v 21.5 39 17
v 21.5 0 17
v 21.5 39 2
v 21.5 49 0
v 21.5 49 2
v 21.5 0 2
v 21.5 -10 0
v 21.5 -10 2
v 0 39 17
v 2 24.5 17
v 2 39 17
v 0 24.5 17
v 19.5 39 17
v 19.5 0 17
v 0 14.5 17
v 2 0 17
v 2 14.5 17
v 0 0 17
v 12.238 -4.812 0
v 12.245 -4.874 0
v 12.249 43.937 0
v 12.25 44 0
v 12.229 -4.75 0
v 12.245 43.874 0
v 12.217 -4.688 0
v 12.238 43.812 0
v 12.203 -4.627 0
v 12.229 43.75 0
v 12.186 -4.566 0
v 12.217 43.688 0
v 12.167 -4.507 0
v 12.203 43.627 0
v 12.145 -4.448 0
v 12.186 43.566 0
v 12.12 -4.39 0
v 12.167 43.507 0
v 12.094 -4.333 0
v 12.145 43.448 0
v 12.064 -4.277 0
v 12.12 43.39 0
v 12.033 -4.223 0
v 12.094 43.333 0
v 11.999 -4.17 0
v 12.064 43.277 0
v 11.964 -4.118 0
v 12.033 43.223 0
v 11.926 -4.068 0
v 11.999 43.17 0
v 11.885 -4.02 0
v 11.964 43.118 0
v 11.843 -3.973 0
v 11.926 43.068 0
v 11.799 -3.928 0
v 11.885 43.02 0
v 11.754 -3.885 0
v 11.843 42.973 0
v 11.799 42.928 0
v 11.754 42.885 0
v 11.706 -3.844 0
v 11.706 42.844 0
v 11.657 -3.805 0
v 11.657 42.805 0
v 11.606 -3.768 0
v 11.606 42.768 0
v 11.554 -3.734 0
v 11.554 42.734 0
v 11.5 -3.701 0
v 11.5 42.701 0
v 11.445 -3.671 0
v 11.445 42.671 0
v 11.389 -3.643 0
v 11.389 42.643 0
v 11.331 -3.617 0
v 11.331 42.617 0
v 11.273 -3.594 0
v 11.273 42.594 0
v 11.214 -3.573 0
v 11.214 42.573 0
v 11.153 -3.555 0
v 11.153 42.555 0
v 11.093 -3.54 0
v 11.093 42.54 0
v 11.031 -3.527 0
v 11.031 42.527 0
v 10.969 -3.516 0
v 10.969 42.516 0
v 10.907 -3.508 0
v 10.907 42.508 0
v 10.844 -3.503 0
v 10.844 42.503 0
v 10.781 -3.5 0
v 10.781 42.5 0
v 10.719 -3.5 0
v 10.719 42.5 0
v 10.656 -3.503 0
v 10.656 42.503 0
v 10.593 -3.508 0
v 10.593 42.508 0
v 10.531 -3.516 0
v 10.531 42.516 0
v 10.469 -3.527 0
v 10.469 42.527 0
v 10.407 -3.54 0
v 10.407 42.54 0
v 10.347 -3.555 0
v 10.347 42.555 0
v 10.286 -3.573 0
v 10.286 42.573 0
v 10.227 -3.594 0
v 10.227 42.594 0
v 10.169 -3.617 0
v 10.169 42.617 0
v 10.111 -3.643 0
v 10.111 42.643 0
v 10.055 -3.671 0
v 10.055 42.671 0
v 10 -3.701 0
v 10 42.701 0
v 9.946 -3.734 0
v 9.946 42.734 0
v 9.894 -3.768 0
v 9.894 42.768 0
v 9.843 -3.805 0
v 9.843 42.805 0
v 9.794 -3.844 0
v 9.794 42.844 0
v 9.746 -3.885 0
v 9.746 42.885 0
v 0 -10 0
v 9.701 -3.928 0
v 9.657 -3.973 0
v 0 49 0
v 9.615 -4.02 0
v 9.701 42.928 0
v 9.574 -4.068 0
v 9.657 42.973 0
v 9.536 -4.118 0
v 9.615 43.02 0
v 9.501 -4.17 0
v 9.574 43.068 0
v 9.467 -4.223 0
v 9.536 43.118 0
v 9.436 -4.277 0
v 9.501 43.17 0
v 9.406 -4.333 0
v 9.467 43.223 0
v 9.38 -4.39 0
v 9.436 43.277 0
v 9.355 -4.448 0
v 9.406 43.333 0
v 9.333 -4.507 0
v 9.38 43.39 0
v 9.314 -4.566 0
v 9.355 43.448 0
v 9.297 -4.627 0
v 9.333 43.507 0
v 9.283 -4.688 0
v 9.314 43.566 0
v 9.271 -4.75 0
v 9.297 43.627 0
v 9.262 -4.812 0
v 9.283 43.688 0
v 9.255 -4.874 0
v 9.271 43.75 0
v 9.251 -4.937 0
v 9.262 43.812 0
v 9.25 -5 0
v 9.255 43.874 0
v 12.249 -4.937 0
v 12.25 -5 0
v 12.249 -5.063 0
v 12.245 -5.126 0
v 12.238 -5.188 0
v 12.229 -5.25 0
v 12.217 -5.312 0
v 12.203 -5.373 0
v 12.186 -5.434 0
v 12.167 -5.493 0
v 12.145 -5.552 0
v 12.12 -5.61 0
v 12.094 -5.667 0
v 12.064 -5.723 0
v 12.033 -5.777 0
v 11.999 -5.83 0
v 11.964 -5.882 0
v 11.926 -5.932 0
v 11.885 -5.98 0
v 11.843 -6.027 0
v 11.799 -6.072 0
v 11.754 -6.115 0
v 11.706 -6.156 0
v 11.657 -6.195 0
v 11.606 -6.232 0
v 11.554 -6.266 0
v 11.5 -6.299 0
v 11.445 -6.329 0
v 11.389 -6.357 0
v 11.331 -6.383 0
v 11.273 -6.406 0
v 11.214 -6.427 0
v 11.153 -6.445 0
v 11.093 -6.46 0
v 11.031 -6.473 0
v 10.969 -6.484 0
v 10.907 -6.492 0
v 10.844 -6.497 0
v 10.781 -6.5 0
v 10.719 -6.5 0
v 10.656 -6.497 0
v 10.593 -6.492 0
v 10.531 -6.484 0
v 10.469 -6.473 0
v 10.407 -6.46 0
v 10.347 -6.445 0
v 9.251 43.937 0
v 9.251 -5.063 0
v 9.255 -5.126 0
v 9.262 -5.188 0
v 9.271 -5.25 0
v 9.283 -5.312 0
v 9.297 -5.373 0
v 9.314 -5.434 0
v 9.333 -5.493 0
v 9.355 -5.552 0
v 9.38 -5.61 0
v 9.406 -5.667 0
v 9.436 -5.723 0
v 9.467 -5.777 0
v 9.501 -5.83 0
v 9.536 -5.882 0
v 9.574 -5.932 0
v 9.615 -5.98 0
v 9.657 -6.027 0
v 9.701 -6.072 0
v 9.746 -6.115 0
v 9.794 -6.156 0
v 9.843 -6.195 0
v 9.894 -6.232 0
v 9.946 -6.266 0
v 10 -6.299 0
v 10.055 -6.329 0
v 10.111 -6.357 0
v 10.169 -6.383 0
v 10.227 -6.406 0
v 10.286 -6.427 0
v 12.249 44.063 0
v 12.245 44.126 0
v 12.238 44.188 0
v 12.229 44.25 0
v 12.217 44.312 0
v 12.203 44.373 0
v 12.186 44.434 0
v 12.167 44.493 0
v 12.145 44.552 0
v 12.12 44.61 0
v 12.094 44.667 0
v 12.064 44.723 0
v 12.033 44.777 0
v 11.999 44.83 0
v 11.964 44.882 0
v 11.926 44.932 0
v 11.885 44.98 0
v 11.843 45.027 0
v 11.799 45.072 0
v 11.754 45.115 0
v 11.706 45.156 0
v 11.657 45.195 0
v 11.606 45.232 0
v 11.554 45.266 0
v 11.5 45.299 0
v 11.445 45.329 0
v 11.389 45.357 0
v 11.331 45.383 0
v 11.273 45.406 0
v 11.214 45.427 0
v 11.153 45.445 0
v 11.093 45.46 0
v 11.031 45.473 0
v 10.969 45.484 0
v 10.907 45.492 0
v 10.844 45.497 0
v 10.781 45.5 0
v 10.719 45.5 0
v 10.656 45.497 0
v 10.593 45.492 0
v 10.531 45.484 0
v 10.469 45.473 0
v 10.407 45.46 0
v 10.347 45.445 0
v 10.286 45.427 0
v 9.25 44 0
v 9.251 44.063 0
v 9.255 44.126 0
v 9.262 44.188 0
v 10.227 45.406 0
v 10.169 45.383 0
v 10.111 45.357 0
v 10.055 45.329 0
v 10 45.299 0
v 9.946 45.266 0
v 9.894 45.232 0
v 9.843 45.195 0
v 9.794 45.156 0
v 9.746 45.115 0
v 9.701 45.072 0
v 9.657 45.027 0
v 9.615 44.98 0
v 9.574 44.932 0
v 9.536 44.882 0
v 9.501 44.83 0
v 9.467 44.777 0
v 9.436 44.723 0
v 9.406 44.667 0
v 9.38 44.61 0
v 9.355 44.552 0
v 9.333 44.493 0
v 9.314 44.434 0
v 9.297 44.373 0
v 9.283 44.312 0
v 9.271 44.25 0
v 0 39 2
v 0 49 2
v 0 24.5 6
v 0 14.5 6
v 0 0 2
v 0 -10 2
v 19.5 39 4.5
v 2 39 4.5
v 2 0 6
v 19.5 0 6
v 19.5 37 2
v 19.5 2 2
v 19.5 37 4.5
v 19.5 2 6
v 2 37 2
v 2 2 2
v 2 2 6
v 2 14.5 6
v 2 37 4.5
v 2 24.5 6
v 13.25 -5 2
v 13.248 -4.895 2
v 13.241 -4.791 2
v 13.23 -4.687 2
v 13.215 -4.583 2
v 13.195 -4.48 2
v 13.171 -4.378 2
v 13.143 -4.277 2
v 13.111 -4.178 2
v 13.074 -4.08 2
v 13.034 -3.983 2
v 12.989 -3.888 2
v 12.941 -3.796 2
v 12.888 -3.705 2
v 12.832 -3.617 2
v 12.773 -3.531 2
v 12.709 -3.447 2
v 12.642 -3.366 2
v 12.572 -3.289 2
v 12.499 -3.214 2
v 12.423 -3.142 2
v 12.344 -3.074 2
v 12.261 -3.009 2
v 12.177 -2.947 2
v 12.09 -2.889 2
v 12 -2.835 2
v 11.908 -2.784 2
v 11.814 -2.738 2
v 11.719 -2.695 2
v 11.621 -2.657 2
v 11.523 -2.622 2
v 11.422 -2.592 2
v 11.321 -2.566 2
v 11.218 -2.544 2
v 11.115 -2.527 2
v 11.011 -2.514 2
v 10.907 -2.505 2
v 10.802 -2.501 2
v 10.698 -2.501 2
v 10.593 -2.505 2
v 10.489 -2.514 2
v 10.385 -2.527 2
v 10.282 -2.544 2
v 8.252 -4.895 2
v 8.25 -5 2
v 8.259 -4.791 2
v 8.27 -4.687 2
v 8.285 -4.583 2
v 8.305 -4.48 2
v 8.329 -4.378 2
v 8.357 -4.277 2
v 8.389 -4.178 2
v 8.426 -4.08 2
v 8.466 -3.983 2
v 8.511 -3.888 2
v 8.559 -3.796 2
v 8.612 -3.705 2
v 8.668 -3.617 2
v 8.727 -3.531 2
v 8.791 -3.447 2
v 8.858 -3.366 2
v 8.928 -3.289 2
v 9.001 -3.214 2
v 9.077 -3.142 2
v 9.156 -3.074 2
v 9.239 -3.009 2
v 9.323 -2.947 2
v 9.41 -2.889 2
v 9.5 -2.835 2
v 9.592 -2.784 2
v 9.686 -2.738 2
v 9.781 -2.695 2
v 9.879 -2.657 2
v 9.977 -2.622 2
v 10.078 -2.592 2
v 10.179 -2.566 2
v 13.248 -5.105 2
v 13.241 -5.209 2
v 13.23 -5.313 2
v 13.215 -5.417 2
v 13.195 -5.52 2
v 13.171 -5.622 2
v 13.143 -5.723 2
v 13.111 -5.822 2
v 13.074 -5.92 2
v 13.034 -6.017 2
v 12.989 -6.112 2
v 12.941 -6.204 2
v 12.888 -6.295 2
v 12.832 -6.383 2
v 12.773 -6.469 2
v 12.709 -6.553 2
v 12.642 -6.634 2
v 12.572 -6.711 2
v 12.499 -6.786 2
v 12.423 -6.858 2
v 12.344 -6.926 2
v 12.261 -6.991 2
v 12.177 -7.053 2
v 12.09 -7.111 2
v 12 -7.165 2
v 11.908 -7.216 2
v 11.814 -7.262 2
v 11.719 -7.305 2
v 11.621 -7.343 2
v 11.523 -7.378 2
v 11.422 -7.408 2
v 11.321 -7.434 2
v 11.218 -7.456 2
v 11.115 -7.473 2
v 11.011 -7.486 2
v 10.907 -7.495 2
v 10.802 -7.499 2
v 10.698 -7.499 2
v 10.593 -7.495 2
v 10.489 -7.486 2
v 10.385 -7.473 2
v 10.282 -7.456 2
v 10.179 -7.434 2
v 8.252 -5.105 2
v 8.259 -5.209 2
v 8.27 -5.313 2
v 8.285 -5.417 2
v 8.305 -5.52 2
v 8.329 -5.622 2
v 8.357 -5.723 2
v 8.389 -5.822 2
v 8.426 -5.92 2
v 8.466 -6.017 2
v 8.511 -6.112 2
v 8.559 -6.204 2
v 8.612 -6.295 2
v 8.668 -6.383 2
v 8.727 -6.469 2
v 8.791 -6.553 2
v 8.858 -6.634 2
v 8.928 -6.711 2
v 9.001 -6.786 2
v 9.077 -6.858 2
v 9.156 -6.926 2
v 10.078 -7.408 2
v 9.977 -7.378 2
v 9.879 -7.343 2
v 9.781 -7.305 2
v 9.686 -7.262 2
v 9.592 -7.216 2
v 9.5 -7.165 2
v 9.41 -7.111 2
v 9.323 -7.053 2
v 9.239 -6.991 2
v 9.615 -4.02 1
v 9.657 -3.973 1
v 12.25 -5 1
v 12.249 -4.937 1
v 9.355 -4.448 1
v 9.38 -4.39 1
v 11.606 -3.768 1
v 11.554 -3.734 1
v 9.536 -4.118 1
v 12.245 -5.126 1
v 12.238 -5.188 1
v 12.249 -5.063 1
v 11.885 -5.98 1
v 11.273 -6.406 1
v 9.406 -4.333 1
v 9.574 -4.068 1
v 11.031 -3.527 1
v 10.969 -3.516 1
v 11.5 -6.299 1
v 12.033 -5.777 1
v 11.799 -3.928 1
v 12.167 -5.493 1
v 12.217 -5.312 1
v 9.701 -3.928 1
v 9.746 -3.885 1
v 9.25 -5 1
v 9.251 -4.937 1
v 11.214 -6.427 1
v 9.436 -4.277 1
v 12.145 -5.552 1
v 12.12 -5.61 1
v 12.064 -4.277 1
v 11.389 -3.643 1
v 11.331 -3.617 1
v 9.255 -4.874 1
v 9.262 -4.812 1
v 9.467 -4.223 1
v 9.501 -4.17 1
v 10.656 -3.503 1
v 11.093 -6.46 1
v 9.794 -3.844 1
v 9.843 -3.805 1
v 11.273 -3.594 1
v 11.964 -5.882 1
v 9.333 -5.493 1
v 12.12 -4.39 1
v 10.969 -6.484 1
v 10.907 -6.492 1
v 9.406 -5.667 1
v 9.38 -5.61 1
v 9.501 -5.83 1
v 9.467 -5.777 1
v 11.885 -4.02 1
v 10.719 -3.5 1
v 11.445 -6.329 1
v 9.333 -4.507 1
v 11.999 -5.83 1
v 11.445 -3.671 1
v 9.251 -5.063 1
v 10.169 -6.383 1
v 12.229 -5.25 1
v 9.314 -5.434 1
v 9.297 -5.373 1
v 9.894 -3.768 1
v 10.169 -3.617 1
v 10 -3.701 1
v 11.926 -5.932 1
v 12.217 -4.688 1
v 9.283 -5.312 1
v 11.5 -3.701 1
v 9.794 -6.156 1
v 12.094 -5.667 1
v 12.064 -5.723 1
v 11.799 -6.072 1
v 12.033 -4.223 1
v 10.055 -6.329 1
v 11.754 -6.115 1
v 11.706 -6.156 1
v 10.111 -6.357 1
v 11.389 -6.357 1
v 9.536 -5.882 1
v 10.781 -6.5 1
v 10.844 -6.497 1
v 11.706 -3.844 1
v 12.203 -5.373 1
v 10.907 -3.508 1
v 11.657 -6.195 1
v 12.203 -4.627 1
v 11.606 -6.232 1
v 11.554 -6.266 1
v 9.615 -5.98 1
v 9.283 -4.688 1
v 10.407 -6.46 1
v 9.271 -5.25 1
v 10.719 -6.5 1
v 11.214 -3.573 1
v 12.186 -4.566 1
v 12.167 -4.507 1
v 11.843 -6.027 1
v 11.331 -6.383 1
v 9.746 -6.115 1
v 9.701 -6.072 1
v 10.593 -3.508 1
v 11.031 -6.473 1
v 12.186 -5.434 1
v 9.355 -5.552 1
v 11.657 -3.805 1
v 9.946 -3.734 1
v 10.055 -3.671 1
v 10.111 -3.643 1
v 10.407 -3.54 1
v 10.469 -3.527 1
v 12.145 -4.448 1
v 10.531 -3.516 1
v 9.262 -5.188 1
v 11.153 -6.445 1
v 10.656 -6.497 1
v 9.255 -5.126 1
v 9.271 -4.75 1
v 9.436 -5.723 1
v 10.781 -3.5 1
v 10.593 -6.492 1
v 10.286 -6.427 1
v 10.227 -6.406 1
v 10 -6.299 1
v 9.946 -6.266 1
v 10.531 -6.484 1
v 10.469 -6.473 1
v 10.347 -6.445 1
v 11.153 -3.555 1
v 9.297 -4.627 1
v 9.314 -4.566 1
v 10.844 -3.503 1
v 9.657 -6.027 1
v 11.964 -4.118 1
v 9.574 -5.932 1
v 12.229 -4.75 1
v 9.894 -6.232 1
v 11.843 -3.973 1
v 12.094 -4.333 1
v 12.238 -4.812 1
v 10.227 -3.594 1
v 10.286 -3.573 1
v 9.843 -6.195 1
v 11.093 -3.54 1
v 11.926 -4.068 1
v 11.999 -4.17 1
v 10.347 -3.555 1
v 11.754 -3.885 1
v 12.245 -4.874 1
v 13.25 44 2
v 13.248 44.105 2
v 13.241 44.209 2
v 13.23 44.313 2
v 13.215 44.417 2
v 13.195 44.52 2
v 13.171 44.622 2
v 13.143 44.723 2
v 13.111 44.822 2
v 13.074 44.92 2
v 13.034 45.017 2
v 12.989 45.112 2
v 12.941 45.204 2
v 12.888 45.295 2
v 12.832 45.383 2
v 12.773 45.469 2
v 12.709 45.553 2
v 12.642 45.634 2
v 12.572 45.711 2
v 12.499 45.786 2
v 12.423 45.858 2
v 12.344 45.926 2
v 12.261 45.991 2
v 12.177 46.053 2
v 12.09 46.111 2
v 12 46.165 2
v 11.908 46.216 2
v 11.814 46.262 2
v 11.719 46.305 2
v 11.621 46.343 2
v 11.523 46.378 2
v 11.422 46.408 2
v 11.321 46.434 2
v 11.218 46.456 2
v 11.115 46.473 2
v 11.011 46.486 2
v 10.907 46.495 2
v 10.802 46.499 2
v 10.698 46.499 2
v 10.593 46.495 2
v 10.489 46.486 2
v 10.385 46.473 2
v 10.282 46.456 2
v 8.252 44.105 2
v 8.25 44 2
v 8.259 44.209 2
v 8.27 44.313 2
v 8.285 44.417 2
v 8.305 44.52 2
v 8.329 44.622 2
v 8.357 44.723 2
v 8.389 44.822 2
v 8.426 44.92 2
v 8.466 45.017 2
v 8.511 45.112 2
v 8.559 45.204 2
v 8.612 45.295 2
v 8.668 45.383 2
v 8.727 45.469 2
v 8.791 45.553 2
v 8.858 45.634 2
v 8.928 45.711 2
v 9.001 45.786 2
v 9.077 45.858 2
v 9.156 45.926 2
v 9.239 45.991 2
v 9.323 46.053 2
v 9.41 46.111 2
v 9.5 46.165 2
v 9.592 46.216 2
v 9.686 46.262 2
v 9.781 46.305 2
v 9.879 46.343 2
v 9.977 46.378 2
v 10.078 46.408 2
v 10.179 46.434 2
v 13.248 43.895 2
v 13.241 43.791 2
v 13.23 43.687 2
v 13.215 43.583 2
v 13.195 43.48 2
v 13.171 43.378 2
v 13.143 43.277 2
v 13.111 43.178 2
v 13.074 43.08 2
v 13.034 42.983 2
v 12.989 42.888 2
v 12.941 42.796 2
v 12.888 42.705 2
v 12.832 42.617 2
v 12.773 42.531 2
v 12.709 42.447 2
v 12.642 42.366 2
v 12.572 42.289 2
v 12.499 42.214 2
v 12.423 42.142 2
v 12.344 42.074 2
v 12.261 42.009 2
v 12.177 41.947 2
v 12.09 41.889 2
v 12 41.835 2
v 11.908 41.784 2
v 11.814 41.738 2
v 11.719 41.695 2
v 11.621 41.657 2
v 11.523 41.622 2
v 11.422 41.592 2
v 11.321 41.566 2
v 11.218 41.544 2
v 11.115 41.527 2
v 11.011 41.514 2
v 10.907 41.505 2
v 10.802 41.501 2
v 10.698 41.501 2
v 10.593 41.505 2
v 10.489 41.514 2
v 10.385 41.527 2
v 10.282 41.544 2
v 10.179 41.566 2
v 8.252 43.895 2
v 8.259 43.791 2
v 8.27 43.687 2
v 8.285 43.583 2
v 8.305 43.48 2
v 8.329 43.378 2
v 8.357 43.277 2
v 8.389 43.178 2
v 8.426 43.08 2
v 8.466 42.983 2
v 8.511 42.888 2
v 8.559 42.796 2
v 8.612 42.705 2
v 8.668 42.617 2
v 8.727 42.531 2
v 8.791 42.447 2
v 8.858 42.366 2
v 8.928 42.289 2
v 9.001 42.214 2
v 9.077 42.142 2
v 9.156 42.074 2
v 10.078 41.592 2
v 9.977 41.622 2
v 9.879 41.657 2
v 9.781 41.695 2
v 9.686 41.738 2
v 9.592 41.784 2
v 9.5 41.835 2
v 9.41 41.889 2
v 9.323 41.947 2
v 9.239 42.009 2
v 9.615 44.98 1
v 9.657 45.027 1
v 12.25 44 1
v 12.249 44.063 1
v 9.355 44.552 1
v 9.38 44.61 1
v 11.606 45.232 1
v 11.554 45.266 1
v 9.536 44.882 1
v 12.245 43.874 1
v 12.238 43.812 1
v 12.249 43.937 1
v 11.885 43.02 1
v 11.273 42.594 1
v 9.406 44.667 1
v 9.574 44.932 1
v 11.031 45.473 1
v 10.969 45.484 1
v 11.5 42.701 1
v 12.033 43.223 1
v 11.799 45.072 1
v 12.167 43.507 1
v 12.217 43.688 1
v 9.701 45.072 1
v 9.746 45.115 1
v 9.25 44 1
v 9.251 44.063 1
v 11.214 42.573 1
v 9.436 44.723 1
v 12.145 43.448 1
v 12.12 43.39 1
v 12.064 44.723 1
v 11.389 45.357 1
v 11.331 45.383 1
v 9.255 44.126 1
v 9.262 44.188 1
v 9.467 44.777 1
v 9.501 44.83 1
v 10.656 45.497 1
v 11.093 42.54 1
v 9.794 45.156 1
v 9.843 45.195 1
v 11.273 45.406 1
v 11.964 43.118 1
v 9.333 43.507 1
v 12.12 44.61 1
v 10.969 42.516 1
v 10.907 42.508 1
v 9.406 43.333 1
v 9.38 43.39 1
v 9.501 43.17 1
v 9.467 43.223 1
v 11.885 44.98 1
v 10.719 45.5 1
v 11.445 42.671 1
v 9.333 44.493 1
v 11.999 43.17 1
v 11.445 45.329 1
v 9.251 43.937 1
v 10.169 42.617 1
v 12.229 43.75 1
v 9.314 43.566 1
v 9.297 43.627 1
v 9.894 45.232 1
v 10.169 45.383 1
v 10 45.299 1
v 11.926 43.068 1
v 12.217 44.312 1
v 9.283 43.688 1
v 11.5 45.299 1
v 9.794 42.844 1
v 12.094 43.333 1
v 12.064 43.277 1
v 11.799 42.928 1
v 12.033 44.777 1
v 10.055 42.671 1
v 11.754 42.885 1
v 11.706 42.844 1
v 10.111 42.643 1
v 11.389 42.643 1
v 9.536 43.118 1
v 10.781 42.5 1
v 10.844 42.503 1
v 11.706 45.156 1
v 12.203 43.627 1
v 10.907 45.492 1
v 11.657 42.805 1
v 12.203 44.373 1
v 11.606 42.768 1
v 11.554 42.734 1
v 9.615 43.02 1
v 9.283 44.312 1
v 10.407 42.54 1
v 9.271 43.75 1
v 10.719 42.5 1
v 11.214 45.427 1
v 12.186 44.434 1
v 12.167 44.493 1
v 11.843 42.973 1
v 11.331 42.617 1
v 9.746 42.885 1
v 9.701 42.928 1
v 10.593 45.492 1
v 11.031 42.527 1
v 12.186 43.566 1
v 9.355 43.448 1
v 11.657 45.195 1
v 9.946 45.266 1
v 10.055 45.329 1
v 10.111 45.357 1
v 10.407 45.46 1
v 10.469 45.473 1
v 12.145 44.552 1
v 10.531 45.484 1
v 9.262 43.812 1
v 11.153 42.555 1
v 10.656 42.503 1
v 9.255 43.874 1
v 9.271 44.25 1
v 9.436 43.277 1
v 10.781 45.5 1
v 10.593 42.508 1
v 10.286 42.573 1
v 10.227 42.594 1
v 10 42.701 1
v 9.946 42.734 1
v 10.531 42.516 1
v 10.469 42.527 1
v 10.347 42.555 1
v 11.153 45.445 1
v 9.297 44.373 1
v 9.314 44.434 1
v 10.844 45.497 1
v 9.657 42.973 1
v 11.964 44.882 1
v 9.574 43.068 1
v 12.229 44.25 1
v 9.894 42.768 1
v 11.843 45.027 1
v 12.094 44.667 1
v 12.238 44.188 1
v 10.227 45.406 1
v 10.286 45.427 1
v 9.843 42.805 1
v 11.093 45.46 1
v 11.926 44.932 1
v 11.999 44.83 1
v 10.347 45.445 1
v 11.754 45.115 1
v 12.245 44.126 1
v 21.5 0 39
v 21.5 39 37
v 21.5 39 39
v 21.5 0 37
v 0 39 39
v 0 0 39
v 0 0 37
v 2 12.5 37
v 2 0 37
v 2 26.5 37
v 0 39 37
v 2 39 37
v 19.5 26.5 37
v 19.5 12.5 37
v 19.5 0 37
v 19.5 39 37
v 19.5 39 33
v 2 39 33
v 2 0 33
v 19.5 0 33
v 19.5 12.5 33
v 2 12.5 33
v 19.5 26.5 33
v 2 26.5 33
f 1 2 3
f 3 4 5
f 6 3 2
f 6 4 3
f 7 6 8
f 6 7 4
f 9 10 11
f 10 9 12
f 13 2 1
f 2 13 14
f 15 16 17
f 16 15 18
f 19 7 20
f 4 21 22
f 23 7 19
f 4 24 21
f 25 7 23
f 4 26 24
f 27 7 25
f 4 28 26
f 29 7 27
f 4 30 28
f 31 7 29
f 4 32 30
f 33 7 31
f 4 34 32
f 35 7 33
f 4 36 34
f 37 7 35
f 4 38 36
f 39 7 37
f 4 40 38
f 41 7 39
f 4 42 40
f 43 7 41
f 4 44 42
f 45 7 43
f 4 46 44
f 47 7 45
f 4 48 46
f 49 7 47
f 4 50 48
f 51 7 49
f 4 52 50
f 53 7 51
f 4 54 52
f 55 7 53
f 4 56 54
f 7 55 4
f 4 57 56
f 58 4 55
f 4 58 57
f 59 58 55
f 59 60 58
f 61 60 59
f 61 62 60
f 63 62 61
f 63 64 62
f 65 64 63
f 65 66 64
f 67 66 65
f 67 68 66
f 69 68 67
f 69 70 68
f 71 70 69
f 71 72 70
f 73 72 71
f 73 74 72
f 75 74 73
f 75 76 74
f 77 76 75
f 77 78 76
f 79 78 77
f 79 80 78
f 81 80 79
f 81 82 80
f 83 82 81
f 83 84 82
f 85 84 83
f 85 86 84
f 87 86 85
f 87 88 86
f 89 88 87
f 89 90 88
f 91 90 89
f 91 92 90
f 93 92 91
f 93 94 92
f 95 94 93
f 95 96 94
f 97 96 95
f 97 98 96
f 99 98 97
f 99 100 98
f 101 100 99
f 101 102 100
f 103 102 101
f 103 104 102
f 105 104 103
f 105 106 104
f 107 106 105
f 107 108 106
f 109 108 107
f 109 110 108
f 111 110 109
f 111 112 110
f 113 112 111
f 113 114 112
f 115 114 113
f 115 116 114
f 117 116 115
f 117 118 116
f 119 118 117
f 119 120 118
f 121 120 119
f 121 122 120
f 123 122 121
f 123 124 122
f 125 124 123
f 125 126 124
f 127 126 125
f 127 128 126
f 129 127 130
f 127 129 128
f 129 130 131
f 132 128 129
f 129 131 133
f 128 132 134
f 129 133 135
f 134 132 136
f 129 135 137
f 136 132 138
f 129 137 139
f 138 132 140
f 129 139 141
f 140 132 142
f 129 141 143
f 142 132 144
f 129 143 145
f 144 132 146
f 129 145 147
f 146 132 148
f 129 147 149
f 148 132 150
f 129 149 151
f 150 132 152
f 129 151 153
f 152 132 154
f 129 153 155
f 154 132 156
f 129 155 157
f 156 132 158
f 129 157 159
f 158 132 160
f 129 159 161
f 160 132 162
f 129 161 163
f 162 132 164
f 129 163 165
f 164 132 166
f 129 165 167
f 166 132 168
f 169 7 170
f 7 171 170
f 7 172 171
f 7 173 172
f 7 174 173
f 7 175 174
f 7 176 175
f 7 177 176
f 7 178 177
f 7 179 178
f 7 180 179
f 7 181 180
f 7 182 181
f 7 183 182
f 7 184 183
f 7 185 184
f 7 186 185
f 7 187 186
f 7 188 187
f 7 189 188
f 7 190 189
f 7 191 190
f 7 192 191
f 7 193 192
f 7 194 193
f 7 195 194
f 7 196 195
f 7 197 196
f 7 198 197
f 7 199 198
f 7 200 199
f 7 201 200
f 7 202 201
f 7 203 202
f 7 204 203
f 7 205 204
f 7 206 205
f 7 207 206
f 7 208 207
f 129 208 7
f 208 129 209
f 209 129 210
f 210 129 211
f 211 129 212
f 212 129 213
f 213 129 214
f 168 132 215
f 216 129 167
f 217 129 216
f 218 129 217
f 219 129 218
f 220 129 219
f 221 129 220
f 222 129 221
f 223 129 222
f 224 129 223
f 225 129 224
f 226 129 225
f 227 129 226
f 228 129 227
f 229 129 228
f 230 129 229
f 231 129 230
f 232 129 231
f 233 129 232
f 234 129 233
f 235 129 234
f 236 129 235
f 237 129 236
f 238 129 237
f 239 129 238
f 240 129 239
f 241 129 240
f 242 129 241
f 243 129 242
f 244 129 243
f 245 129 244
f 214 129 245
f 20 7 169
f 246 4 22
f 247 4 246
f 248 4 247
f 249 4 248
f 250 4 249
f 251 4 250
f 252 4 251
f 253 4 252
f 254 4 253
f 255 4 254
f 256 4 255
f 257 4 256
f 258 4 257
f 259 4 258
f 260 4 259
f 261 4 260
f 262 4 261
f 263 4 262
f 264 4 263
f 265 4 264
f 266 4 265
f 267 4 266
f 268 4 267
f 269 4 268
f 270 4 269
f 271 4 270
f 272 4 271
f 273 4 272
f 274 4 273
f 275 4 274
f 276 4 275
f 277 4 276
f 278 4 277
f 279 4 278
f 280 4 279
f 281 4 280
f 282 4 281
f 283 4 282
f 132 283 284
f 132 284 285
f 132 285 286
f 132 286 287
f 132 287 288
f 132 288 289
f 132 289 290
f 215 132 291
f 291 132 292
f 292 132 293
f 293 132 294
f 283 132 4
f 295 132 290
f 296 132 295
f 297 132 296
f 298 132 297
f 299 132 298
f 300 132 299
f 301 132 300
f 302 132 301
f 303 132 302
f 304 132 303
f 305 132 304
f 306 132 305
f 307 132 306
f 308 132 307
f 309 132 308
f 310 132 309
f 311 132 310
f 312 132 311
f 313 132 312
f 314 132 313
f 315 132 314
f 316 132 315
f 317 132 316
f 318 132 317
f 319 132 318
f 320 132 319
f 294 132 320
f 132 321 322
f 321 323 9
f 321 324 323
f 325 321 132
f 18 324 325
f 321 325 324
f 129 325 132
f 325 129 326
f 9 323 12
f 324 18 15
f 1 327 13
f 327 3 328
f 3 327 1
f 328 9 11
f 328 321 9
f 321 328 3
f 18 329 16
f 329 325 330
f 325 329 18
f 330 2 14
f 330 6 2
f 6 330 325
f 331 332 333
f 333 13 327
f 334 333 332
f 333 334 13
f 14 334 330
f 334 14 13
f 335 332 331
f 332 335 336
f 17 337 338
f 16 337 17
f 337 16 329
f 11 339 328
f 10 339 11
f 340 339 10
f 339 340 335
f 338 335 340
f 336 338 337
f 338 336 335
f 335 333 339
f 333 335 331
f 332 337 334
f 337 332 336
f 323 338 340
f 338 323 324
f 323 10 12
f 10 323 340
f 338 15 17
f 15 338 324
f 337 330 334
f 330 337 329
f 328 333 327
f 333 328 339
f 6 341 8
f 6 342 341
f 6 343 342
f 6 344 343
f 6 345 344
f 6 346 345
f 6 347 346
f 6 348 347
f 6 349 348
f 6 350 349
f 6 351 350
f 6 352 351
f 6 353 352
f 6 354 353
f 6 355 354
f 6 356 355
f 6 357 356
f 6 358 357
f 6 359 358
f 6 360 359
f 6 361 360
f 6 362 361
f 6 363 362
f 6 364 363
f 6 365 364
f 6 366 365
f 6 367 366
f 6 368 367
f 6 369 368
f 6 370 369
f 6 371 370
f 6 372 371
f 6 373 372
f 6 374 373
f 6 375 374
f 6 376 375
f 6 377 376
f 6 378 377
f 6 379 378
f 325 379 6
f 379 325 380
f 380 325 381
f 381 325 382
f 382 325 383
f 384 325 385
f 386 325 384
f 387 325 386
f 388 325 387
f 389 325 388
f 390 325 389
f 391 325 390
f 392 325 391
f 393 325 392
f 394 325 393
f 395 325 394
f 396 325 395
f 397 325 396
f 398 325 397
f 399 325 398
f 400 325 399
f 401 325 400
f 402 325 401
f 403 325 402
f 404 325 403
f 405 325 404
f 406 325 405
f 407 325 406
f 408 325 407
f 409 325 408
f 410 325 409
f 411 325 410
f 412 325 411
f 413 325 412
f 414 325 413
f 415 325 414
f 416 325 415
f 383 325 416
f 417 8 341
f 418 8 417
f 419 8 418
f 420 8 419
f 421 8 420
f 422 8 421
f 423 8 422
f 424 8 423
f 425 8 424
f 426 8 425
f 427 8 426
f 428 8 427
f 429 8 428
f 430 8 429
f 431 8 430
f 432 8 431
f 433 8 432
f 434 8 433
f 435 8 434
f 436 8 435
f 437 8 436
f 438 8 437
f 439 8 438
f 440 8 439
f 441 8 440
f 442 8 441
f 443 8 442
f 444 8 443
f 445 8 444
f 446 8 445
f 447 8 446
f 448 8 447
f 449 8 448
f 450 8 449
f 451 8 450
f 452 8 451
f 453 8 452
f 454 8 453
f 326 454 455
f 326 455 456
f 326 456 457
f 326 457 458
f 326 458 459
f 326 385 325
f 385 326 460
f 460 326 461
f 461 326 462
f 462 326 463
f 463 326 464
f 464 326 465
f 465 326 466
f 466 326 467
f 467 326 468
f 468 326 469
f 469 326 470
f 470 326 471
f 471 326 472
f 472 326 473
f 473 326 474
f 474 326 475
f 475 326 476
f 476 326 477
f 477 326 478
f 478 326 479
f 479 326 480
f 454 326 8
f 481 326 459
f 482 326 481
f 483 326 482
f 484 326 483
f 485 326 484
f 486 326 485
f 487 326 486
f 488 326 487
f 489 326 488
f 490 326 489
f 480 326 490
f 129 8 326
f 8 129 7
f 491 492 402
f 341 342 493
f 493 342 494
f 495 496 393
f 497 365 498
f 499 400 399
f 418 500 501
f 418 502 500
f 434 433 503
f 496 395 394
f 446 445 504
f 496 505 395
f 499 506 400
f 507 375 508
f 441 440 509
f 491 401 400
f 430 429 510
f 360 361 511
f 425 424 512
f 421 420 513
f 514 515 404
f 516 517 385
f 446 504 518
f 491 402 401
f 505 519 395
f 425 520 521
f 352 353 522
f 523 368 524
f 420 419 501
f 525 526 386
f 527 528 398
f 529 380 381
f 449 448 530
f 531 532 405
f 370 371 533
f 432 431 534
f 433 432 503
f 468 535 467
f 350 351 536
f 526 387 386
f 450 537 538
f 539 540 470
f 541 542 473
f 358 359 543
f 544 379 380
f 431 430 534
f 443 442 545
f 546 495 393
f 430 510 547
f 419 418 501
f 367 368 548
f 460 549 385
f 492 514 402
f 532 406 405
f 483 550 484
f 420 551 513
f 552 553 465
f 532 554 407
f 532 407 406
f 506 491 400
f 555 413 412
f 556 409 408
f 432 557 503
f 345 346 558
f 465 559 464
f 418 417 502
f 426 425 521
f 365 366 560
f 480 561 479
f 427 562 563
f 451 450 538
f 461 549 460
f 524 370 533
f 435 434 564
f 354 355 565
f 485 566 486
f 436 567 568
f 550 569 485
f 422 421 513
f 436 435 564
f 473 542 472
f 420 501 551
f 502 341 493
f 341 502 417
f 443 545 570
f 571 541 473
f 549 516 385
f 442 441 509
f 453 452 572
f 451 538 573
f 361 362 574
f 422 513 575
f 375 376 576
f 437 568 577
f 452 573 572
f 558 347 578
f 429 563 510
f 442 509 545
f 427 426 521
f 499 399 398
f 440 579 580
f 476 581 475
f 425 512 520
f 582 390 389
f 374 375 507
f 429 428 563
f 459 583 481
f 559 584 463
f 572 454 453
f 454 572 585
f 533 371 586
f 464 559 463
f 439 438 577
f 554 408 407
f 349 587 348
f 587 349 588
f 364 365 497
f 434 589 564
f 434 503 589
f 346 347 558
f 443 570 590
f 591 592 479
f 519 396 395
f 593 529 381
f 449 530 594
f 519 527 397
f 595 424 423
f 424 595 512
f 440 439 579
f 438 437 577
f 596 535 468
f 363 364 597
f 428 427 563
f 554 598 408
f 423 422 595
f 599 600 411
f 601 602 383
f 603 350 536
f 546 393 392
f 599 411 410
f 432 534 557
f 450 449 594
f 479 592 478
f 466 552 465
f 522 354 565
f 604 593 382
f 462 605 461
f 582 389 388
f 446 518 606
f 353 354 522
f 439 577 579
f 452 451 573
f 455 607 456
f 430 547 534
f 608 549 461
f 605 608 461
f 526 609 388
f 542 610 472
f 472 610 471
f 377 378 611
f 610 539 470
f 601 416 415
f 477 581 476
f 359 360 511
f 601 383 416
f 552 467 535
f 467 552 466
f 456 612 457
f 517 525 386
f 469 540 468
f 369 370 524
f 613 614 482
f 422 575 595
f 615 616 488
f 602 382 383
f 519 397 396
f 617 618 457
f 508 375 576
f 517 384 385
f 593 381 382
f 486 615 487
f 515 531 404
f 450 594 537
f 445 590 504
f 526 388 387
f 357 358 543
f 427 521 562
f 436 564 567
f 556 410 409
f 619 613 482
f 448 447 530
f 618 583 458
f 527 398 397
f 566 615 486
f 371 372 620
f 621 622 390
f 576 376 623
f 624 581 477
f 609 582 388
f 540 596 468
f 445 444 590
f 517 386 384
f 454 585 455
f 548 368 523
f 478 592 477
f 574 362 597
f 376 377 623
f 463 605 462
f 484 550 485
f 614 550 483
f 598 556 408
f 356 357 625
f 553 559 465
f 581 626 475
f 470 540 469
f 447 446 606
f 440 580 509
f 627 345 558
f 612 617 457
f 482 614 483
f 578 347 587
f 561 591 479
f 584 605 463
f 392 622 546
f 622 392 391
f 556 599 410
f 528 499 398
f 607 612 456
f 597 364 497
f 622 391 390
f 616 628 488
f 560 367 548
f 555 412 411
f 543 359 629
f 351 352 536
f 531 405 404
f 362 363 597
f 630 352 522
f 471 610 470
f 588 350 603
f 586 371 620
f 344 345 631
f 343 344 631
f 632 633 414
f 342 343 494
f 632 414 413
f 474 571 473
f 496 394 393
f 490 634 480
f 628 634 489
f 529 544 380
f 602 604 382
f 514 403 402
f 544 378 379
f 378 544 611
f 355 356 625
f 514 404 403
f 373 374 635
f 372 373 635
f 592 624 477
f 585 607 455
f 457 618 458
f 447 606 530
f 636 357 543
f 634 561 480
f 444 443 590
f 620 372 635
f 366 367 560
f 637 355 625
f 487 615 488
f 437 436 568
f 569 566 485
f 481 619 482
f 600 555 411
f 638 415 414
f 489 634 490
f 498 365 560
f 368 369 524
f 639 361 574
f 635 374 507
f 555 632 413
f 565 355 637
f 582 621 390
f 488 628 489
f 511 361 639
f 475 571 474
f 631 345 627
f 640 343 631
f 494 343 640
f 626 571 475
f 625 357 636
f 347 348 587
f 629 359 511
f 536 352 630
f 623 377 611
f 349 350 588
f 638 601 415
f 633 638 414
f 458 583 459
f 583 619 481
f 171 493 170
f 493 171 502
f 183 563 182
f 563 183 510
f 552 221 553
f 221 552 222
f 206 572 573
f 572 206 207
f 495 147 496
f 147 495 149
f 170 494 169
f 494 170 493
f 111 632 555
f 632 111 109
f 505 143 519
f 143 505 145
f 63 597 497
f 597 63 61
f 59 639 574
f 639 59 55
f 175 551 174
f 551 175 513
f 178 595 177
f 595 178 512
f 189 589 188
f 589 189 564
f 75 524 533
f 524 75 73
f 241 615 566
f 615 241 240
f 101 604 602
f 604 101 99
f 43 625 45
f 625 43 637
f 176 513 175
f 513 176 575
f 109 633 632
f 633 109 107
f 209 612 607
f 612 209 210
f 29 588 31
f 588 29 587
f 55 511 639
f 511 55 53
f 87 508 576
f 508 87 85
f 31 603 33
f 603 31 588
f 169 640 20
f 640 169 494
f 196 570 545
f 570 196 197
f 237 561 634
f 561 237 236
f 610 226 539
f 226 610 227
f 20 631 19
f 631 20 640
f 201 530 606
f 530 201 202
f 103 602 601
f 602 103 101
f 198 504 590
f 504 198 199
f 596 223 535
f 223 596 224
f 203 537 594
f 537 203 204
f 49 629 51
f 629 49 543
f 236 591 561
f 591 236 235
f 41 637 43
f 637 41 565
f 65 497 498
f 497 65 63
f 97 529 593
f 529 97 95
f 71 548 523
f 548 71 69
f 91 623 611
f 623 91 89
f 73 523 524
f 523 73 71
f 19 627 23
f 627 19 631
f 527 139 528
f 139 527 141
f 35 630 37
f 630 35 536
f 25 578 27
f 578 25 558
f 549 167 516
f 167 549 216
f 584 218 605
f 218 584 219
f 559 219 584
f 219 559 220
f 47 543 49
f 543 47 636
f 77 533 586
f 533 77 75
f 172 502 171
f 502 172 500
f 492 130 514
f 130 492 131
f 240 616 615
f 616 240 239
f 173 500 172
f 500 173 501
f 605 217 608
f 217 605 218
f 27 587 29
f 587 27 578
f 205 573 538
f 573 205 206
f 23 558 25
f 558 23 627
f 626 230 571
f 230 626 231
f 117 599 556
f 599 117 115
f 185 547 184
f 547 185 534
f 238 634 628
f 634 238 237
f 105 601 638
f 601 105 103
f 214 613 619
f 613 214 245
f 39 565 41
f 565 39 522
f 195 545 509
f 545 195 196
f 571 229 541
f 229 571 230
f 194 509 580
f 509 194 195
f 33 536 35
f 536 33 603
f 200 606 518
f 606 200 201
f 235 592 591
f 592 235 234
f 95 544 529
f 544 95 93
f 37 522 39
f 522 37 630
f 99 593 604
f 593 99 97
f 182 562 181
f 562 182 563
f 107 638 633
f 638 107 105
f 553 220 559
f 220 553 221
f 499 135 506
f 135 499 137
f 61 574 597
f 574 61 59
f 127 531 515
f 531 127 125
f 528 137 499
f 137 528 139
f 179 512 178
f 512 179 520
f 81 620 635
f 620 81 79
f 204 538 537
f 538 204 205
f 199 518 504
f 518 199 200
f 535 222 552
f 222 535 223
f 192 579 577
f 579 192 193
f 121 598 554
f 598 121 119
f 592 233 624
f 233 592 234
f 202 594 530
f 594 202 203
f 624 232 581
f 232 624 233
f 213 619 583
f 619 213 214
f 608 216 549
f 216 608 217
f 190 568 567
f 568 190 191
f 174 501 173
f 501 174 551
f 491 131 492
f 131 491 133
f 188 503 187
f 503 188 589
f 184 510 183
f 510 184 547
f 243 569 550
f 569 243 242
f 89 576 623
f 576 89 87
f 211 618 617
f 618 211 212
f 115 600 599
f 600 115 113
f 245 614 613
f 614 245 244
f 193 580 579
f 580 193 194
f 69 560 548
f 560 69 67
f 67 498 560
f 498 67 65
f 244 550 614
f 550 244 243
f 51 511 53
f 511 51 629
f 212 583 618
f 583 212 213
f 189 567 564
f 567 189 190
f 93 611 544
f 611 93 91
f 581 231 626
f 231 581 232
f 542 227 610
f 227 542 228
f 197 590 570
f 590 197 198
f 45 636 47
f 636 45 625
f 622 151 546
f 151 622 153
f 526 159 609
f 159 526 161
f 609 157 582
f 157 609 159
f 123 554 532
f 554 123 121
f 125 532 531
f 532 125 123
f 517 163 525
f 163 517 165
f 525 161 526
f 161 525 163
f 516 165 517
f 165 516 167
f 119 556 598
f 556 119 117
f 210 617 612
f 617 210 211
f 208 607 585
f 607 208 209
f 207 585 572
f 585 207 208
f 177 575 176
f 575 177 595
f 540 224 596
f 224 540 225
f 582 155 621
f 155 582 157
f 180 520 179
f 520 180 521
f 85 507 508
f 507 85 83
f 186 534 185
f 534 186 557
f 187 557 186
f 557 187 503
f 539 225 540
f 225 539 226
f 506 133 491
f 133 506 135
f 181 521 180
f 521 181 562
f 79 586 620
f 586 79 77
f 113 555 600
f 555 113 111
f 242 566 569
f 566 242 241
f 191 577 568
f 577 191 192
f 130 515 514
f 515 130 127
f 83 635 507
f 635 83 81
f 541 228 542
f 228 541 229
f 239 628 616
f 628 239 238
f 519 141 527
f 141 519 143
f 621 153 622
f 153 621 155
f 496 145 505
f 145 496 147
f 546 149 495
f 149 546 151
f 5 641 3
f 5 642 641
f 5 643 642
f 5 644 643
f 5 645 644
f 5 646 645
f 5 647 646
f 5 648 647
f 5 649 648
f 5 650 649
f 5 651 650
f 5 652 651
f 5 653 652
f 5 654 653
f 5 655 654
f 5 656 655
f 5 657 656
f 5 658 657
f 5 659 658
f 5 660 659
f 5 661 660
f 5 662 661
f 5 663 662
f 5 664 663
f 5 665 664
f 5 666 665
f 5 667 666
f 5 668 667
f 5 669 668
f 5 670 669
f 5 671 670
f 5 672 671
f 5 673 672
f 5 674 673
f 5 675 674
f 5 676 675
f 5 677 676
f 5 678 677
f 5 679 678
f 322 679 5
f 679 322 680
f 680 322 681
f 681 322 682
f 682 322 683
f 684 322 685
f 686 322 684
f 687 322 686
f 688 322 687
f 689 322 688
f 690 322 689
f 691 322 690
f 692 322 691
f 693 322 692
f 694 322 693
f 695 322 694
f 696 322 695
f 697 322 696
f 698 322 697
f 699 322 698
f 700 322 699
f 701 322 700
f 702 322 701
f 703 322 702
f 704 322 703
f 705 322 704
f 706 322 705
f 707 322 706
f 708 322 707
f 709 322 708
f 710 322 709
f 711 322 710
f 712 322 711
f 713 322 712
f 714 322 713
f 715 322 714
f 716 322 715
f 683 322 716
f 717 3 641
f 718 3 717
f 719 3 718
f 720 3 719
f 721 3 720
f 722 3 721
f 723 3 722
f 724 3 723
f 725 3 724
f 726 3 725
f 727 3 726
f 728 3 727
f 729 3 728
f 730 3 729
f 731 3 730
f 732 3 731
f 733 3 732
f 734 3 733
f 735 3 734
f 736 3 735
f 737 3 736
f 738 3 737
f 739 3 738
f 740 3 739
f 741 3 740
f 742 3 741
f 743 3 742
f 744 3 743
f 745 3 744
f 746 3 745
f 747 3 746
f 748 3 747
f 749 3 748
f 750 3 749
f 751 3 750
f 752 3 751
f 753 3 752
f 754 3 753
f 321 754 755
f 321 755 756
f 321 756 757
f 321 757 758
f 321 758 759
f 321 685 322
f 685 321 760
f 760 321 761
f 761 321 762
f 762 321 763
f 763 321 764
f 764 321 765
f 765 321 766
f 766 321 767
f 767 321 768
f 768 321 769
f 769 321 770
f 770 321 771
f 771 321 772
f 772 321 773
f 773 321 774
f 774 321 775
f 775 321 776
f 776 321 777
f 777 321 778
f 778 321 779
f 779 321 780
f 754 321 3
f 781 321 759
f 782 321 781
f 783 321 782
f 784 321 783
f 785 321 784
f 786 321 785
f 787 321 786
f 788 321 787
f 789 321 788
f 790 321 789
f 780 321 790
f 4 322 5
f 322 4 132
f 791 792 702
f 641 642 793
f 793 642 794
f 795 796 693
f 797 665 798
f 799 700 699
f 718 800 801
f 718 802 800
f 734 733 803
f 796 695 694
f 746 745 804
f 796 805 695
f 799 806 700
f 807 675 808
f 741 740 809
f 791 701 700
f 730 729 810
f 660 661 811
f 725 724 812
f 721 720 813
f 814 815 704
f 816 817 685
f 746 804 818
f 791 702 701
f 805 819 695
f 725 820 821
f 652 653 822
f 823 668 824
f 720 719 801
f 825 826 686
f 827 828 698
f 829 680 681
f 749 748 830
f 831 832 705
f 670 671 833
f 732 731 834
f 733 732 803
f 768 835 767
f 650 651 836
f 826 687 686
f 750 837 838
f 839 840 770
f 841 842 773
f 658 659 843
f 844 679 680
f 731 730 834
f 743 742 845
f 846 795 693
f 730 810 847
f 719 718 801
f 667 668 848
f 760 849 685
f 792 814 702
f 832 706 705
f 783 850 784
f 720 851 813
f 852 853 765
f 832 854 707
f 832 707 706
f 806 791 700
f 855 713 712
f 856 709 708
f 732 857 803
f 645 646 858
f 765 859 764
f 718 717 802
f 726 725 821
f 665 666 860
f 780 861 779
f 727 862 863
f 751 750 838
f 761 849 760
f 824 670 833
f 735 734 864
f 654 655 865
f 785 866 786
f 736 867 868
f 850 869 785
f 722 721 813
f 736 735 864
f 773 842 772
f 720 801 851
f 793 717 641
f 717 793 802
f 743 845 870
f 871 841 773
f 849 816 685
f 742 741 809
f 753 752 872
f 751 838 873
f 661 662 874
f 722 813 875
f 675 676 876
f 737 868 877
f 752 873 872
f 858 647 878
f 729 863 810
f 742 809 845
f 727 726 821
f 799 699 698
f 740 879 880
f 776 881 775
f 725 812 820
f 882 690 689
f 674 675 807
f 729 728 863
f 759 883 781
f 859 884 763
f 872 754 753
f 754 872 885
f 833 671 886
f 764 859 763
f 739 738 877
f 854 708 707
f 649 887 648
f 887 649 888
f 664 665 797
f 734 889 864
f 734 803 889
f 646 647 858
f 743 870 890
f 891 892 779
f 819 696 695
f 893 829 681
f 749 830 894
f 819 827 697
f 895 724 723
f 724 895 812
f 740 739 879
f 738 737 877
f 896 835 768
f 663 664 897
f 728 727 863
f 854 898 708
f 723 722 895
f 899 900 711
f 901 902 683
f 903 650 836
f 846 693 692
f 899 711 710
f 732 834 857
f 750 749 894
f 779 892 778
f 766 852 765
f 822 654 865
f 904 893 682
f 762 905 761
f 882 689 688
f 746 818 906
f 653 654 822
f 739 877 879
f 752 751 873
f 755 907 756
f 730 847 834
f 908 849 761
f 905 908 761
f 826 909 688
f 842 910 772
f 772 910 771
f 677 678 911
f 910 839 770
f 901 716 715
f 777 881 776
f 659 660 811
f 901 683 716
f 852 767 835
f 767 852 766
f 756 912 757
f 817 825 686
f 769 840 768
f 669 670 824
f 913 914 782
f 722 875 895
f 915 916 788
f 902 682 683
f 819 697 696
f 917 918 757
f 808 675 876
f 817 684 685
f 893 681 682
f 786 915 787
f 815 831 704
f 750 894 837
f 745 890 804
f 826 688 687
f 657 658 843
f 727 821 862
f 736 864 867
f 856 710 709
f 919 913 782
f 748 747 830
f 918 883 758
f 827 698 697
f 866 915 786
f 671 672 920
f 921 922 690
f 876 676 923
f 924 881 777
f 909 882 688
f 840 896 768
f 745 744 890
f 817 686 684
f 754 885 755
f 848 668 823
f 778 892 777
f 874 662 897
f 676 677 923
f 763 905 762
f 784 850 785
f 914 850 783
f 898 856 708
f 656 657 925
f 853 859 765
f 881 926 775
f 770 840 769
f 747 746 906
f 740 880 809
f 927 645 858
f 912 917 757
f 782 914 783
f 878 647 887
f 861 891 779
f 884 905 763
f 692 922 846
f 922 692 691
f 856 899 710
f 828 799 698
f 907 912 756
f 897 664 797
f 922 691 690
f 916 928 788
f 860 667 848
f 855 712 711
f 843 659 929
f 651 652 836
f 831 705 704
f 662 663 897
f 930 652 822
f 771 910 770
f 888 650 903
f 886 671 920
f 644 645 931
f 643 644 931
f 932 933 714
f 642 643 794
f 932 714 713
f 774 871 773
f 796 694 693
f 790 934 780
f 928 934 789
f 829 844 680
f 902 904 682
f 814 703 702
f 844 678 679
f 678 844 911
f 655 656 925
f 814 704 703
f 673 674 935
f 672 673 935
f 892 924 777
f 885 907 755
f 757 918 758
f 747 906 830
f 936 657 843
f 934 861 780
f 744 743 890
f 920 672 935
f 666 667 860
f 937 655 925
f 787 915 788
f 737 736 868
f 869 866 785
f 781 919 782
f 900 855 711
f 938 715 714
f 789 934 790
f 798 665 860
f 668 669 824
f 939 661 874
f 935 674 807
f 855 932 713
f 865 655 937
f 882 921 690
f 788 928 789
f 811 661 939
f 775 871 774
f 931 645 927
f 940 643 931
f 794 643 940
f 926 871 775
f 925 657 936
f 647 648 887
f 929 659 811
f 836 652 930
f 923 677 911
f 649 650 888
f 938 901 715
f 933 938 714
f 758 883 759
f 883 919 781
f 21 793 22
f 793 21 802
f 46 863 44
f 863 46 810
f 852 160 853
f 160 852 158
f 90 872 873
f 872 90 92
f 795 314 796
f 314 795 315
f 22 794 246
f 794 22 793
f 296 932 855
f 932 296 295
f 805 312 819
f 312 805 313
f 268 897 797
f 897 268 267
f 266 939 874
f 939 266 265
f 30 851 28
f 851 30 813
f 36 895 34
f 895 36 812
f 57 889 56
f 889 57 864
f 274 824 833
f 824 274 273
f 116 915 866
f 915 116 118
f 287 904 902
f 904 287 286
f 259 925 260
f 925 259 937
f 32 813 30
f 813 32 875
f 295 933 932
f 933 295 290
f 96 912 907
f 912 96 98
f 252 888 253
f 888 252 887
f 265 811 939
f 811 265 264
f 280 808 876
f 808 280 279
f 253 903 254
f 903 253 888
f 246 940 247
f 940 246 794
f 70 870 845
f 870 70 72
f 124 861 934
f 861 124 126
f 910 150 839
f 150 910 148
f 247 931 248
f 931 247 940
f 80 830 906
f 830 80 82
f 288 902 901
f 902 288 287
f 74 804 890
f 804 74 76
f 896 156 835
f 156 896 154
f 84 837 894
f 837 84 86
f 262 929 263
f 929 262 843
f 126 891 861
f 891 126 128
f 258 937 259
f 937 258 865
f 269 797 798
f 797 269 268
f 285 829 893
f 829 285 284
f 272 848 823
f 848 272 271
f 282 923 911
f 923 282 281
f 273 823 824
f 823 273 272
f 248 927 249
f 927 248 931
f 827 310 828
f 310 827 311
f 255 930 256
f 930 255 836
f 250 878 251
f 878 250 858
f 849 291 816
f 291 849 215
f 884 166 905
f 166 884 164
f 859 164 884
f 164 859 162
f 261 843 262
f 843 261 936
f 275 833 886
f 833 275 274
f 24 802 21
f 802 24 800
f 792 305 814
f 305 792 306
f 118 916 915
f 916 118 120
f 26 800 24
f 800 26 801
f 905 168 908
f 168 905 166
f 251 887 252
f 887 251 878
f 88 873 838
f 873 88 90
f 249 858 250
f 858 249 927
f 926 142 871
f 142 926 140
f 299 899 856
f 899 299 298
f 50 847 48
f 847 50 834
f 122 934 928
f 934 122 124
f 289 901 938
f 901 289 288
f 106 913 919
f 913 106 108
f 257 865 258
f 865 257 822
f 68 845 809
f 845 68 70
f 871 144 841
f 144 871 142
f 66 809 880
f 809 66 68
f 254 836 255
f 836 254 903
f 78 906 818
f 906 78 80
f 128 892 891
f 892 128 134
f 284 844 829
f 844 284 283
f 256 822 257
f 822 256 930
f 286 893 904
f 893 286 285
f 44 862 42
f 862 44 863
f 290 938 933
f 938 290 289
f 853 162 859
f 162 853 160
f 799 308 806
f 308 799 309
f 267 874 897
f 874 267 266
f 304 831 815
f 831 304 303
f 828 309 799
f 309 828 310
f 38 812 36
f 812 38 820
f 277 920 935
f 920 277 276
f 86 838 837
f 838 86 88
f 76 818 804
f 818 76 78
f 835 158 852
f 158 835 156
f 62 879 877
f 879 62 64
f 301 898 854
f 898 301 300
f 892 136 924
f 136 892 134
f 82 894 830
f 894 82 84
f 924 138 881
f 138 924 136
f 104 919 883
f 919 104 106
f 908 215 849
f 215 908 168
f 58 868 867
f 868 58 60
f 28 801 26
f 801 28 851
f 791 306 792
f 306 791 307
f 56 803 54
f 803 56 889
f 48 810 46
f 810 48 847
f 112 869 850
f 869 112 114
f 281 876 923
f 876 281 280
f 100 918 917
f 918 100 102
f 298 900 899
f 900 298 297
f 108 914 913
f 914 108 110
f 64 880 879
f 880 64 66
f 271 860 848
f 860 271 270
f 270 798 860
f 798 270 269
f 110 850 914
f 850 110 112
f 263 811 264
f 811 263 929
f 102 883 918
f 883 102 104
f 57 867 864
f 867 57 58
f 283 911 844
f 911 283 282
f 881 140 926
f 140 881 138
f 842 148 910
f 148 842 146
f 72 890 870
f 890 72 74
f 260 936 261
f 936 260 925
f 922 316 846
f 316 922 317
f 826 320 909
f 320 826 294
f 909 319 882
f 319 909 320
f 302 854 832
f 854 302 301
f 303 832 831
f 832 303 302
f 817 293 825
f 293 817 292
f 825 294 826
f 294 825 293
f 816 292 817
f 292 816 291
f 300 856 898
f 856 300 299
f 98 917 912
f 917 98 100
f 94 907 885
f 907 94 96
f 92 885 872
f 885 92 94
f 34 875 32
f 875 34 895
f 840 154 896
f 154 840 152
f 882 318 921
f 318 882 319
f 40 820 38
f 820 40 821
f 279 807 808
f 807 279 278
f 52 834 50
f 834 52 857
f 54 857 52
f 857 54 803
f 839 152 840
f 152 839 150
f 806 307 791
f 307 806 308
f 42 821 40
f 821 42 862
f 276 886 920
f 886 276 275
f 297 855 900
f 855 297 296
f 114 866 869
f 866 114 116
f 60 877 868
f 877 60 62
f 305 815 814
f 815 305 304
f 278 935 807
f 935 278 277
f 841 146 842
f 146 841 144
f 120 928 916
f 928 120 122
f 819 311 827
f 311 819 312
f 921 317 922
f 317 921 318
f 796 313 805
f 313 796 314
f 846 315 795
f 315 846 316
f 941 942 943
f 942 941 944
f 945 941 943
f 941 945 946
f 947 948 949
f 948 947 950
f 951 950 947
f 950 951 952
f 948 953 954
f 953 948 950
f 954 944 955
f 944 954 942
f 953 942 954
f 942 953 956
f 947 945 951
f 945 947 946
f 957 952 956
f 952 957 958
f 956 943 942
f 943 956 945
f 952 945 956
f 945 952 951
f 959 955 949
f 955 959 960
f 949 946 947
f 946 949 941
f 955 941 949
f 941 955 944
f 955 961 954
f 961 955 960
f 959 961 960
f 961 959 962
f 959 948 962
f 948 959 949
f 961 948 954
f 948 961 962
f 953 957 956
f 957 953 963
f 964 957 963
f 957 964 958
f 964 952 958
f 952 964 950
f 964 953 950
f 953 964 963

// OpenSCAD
$fn=150;

pcbX=17.5;
pcbY=35;
pcbZ=4;
pcbThickness=1.5;

caseZ=15;

wallThickness=2;
extra=0.1;

potiZ=11;
potiY=10;

potiYtrans=12.5;

usbPort1Z=7;
usbPort2Z=4;

screwPlateY=10;
screwPlateZ=4;

screwR=3/2;
screwHeadR=5/2;

module fanRegCase()
{
  difference() {
    cube([pcbX+wallThickness*2,pcbY+wallThickness*2,caseZ+wallThickness]);
    translate([wallThickness,wallThickness,wallThickness]) cube([pcbX,pcbY,caseZ+wallThickness+extra]);

    /* poti cutout */
    translate([0,wallThickness+potiYtrans,wallThickness+pcbZ])
      cube([wallThickness,potiY,potiZ+wallThickness]);

    /* usb port cutout */
    translate([wallThickness,0,wallThickness+pcbZ])
      cube([pcbX,wallThickness,potiZ]);

    translate([wallThickness,pcbY+wallThickness,wallThickness+pcbZ-pcbThickness])
      cube([pcbX,wallThickness,potiZ+pcbThickness]);
  }

  translate([0,-screwPlateY,0]) screwPlate();
  translate([0,pcbY+wallThickness*2,0]) screwPlate();


}

module screwPlate()
{
  difference() {
    cube([pcbX+wallThickness*2,screwPlateY,wallThickness]);
    translate([(pcbX+wallThickness*2)/2,screwPlateY/2,wallThickness/2]) cylinder(r1=screwR,r2=screwHeadR,h=wallThickness/2);
    translate([(pcbX+wallThickness*2)/2,screwPlateY/2,0]) cylinder(r=screwR,h=wallThickness/2);
  }
}
/* translate([0,-screwPlateY,0]) screwPlate(); */

module fanRegLid()
{
  translate([0,0,caseZ+wallThickness]) cube([pcbX+wallThickness*2,pcbY+wallThickness*2,wallThickness]);
  translate([wallThickness,0,wallThickness+pcbZ+usbPort1Z]) cube([pcbX,potiYtrans,wallThickness*3]);
  translate([wallThickness,pcbY+wallThickness*2-potiYtrans,wallThickness+pcbZ+usbPort1Z]) cube([pcbX,potiYtrans,wallThickness*3]);
}


fanRegCase();
translate([0,0,20]) fanRegLid();
